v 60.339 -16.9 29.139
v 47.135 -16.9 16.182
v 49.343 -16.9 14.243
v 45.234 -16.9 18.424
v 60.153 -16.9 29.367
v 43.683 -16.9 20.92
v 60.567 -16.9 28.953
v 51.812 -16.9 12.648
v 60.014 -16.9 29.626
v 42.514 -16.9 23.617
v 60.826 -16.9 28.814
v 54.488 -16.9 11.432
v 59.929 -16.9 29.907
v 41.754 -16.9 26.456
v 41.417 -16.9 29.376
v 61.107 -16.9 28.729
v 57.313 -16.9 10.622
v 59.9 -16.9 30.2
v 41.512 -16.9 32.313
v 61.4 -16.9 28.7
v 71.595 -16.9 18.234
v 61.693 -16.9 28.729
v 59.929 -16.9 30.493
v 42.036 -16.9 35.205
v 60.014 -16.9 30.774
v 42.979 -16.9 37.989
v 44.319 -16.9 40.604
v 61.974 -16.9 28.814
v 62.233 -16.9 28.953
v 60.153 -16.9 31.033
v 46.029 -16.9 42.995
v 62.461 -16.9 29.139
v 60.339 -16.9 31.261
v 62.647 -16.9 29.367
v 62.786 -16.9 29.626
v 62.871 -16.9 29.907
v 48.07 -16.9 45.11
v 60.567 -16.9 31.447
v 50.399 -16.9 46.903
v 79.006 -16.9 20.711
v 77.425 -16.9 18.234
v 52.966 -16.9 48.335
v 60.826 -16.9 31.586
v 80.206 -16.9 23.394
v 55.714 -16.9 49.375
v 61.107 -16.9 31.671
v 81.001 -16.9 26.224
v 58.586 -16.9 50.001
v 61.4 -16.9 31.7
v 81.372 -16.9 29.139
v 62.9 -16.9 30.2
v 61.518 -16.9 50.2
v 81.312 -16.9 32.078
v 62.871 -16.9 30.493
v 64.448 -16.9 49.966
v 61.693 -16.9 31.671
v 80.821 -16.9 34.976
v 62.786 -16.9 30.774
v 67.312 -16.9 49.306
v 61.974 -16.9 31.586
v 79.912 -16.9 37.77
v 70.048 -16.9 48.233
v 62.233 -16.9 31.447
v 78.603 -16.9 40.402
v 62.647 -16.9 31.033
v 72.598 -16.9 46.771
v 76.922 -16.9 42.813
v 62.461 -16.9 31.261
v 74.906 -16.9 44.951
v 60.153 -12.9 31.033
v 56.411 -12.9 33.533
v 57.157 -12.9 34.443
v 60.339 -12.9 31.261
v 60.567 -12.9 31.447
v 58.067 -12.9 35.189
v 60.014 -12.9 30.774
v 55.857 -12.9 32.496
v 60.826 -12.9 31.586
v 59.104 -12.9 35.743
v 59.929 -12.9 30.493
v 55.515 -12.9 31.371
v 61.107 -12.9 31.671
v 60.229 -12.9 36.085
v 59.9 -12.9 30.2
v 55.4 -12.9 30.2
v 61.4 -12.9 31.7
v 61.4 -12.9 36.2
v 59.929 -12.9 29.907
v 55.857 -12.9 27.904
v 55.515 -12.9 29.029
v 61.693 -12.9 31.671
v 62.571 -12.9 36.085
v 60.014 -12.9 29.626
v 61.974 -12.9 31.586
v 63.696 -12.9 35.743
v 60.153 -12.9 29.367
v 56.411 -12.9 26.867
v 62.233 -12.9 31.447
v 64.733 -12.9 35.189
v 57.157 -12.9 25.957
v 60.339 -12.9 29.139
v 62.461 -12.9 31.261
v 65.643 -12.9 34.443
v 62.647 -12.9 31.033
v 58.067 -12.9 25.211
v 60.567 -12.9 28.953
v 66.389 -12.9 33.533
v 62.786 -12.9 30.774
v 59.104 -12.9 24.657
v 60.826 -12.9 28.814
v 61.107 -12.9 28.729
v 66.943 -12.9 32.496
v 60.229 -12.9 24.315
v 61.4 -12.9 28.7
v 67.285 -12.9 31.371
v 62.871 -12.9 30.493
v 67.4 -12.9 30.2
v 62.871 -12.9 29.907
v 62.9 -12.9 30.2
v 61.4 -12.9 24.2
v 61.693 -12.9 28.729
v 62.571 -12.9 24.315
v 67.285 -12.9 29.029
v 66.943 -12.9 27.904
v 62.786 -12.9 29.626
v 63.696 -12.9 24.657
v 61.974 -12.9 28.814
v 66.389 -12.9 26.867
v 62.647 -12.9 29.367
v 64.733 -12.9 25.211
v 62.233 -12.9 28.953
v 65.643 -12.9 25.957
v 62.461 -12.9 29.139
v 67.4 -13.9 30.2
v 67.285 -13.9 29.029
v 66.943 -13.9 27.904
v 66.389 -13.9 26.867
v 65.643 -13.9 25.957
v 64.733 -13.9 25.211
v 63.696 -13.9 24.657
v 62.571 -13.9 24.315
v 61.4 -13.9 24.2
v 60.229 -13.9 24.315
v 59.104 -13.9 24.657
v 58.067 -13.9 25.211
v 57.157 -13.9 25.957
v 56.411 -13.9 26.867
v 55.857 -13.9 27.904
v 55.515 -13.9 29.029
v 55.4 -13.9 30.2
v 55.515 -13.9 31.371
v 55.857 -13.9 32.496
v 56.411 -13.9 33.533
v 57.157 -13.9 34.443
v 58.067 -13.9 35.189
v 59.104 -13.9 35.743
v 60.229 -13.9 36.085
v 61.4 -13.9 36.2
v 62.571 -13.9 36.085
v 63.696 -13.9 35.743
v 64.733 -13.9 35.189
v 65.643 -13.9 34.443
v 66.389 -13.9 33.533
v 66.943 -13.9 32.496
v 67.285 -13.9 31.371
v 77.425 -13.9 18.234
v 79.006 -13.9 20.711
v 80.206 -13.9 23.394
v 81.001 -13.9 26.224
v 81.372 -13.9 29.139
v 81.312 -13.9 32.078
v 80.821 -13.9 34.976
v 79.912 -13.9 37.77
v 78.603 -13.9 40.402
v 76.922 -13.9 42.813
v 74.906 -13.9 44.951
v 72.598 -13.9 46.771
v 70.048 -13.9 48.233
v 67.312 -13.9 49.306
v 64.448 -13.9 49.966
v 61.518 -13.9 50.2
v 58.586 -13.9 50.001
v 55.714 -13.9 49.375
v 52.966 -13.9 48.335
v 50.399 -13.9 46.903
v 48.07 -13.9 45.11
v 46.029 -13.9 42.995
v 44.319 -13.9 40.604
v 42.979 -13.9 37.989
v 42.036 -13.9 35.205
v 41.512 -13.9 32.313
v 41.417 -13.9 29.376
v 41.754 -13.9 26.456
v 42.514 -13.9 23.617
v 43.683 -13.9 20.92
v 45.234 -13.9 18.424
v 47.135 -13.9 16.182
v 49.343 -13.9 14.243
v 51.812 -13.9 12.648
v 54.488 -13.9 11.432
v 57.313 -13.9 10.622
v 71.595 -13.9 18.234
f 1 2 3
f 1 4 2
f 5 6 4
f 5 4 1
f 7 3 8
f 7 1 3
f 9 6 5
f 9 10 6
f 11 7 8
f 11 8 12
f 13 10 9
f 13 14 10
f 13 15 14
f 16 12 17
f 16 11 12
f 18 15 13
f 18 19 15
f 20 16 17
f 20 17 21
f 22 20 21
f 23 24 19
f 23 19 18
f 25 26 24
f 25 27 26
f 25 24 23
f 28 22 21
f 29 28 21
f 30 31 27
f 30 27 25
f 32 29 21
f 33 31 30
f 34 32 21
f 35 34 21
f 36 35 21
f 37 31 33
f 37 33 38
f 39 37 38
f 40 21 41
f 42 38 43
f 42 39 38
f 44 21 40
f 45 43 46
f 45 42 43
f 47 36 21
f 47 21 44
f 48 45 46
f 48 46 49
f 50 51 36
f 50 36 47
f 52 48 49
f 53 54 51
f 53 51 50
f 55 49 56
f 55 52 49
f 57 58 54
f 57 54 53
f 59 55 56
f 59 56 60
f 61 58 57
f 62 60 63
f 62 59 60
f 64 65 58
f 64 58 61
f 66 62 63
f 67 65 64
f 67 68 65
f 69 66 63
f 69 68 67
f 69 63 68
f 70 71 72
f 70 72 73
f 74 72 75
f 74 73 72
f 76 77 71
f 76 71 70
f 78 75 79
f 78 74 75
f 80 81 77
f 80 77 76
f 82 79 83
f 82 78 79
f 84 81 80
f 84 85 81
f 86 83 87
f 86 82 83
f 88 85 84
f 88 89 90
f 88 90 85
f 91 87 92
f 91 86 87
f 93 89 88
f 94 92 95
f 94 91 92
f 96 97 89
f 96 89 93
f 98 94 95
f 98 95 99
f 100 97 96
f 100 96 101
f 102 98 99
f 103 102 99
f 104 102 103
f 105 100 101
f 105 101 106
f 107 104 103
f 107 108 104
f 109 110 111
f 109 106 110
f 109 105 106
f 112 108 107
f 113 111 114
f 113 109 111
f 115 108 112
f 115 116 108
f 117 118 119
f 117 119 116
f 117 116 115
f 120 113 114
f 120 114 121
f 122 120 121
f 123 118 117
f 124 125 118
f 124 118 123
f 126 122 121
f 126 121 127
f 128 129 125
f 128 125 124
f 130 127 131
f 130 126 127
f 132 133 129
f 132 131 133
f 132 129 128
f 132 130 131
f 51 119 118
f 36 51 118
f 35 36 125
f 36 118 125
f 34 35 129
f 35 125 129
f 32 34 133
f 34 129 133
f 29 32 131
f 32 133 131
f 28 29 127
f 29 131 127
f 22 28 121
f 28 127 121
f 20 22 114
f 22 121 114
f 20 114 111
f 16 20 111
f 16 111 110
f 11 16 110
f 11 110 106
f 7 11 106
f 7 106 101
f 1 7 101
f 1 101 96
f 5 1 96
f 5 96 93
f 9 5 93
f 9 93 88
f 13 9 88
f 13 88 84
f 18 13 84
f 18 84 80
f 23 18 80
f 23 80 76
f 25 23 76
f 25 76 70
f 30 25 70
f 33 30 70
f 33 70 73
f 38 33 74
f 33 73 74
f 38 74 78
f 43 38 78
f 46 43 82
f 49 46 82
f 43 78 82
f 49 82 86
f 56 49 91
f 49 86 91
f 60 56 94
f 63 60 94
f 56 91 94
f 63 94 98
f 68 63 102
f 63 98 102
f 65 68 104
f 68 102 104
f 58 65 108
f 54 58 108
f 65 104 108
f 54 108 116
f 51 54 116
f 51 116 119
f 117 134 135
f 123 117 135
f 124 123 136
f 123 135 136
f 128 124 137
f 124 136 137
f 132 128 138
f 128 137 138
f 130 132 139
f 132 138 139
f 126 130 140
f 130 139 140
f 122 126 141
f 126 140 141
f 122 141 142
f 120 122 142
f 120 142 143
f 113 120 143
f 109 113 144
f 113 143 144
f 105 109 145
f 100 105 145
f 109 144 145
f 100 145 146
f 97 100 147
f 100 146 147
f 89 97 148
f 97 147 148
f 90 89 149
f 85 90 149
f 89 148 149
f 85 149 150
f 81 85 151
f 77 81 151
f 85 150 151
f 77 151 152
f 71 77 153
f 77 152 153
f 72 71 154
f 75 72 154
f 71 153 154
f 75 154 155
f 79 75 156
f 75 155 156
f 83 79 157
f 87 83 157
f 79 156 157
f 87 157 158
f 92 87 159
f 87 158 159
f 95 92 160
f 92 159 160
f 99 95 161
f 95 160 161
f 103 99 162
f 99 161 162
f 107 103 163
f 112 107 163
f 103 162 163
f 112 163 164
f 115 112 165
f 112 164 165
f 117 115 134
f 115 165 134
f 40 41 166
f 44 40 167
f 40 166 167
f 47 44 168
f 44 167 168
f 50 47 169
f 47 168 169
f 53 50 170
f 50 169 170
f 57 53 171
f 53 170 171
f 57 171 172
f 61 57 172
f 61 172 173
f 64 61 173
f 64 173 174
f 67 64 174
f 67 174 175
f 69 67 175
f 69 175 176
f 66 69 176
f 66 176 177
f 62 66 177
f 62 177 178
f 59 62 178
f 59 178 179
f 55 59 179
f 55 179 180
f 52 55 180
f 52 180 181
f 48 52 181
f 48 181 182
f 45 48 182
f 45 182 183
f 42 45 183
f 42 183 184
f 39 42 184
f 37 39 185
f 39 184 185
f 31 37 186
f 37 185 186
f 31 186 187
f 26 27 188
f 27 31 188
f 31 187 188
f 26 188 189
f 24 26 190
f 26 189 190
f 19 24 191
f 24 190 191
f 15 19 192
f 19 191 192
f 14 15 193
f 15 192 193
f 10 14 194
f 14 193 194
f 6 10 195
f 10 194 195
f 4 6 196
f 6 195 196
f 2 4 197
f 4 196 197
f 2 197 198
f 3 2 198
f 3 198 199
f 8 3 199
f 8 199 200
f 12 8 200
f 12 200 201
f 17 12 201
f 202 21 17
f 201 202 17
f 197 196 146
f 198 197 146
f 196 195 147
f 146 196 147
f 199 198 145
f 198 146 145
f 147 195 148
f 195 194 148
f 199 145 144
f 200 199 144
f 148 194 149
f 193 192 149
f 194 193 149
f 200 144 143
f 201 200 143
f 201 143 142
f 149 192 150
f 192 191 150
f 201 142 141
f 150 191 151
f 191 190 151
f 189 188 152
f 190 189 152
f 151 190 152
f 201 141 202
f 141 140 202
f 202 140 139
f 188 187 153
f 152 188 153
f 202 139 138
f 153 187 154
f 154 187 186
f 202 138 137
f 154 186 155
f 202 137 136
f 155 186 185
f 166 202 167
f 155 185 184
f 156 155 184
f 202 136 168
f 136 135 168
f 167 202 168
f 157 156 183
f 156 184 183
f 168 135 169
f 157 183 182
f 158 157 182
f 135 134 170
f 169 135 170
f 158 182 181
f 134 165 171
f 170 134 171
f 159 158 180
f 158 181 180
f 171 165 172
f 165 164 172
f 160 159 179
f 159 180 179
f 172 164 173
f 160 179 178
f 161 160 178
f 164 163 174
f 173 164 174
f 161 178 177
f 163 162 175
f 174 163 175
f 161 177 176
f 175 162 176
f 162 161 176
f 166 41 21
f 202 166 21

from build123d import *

# Parameters (mm, degrees)
SKETCH014_R     = 20
PAD010_DEPTH    = 3
SKETCH015_R     = 6
PAD011_DEPTH    = 1
SKETCH016_R     = 1.5
POCKET003_DEPTH = 5
POCKET004_DEPTH = 5


with BuildPart() as part:
    # Sketch014 → Pad010 (new body)
    with BuildSketch(Plane.XZ):
        Circle(SKETCH014_R)
    extrude(amount=PAD010_DEPTH)

    # Sketch015 (on Face2 of Pad010) → Pad011 (join)
    with BuildSketch(Plane(origin=(0, 0, 0), x_dir=(1, 0, 0), z_dir=(0, 1, 0))):
        Circle(SKETCH015_R)
    extrude(amount=PAD011_DEPTH)

    # Sketch016 (on Face5 of Pad011) → Pocket003 (cut)
    with BuildSketch(Plane(origin=(0, 1, 0), x_dir=(1, 0, 0), z_dir=(0, 1, 0))):
        Circle(SKETCH016_R)
    extrude(amount=-POCKET003_DEPTH, mode=Mode.SUBTRACT)

    # Sketch020 (on Face3 of Pocket003) → Pocket004 (cut)
    with BuildSketch(Plane.XZ.offset(3)):
        Polygon((17.052171, -11.966453), (10.195413, -11.966453), (-6.895316, -21.074684), (18.587267, -21.074684), align=None)
    extrude(amount=-POCKET004_DEPTH, mode=Mode.SUBTRACT)


with BuildPart() as part_1:
    # Body002 placement: moved
    add(part.part.moved(Location((61.4, -13.9, 30.2))))


solid = part_1.part
